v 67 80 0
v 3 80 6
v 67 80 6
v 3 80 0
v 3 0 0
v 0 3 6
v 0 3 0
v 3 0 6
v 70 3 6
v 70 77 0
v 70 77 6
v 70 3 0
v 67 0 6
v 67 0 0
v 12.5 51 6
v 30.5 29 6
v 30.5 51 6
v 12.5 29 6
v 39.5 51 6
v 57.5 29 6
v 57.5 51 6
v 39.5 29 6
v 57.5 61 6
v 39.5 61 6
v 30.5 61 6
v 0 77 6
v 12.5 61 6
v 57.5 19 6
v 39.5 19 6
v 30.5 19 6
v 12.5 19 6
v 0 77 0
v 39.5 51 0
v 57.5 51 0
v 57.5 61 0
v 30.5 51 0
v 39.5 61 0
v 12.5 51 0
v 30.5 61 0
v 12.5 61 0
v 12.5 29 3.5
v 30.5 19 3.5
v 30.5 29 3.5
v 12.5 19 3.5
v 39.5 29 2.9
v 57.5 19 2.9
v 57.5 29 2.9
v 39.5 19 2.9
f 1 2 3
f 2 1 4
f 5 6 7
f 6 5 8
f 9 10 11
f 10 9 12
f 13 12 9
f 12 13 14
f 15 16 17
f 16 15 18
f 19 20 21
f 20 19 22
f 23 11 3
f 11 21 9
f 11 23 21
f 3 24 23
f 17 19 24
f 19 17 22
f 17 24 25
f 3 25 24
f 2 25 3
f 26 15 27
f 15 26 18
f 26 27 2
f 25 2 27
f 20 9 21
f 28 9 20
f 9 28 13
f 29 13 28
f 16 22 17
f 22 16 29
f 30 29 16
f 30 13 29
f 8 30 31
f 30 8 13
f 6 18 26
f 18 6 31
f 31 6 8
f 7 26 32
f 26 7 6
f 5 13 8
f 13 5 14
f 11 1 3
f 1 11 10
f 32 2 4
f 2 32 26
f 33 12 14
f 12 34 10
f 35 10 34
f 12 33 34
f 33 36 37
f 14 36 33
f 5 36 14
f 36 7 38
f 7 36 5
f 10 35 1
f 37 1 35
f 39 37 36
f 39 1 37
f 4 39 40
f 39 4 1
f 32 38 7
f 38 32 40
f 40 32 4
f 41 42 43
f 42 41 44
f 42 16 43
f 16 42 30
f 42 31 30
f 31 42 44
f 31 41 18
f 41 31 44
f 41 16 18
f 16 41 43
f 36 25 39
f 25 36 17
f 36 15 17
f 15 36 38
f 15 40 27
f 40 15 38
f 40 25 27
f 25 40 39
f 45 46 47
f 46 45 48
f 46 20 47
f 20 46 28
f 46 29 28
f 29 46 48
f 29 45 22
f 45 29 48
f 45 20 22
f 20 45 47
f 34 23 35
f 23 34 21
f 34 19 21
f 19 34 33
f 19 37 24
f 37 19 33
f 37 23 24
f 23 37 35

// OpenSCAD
$fn = 32;

// ----------------------------------------------------------------------
// Windowed plate: 4 voids, 70 x 80 x 6 mm
// ----------------------------------------------------------------------

// --- parameters (mm) ---
plate_l = 70;             // plate length, X
plate_w = 80;             // plate width, Y
plate_t = 6;              // plate thickness, Z
edge_margin = 8;          // wall from the plate edge to any window
win_l = 18;               // pocket length
win_w = 10;               // pocket width
pitch_x = 27;             // grid pitch along X
pitch_y = 32;             // grid pitch along Y
depth_1 = 2.5;            // depth of void 1 (full thickness = through)
depth_2 = 6;              // depth of void 2 (full thickness = through)
depth_3 = 3.1;            // depth of void 3 (full thickness = through)
depth_4 = 6;              // depth of void 4 (full thickness = through)
corner_c = 3;             // corner chamfer of the plate

profile = [[3, 0], [67, 0], [70, 3], [70, 77], [67, 80], [3, 80], [0, 77], [0, 3]];  // primary outline, 8 points, counter clockwise
void_1 = [[12.5, 19], [30.5, 19], [30.5, 29], [12.5, 29]];  // pocket at grid node 0,0, 4 points
void_2 = [[12.5, 51], [30.5, 51], [30.5, 61], [12.5, 61]];  // pocket at grid node 0,1, 4 points
void_3 = [[39.5, 19], [57.5, 19], [57.5, 29], [39.5, 29]];  // pocket at grid node 1,0, 4 points
void_4 = [[39.5, 51], [57.5, 51], [57.5, 61], [39.5, 61]];  // pocket at grid node 1,1, 4 points

// --- the one profile operation ---
difference() {
  linear_extrude(height = plate_t) polygon(points = profile);
  translate([0, 0, plate_t - depth_1])
    linear_extrude(height = depth_1 + 1) polygon(points = void_1);
  translate([0, 0, -1])
    linear_extrude(height = plate_t + 2) polygon(points = void_2);
  translate([0, 0, plate_t - depth_3])
    linear_extrude(height = depth_3 + 1) polygon(points = void_3);
  translate([0, 0, -1])
    linear_extrude(height = plate_t + 2) polygon(points = void_4);
}
